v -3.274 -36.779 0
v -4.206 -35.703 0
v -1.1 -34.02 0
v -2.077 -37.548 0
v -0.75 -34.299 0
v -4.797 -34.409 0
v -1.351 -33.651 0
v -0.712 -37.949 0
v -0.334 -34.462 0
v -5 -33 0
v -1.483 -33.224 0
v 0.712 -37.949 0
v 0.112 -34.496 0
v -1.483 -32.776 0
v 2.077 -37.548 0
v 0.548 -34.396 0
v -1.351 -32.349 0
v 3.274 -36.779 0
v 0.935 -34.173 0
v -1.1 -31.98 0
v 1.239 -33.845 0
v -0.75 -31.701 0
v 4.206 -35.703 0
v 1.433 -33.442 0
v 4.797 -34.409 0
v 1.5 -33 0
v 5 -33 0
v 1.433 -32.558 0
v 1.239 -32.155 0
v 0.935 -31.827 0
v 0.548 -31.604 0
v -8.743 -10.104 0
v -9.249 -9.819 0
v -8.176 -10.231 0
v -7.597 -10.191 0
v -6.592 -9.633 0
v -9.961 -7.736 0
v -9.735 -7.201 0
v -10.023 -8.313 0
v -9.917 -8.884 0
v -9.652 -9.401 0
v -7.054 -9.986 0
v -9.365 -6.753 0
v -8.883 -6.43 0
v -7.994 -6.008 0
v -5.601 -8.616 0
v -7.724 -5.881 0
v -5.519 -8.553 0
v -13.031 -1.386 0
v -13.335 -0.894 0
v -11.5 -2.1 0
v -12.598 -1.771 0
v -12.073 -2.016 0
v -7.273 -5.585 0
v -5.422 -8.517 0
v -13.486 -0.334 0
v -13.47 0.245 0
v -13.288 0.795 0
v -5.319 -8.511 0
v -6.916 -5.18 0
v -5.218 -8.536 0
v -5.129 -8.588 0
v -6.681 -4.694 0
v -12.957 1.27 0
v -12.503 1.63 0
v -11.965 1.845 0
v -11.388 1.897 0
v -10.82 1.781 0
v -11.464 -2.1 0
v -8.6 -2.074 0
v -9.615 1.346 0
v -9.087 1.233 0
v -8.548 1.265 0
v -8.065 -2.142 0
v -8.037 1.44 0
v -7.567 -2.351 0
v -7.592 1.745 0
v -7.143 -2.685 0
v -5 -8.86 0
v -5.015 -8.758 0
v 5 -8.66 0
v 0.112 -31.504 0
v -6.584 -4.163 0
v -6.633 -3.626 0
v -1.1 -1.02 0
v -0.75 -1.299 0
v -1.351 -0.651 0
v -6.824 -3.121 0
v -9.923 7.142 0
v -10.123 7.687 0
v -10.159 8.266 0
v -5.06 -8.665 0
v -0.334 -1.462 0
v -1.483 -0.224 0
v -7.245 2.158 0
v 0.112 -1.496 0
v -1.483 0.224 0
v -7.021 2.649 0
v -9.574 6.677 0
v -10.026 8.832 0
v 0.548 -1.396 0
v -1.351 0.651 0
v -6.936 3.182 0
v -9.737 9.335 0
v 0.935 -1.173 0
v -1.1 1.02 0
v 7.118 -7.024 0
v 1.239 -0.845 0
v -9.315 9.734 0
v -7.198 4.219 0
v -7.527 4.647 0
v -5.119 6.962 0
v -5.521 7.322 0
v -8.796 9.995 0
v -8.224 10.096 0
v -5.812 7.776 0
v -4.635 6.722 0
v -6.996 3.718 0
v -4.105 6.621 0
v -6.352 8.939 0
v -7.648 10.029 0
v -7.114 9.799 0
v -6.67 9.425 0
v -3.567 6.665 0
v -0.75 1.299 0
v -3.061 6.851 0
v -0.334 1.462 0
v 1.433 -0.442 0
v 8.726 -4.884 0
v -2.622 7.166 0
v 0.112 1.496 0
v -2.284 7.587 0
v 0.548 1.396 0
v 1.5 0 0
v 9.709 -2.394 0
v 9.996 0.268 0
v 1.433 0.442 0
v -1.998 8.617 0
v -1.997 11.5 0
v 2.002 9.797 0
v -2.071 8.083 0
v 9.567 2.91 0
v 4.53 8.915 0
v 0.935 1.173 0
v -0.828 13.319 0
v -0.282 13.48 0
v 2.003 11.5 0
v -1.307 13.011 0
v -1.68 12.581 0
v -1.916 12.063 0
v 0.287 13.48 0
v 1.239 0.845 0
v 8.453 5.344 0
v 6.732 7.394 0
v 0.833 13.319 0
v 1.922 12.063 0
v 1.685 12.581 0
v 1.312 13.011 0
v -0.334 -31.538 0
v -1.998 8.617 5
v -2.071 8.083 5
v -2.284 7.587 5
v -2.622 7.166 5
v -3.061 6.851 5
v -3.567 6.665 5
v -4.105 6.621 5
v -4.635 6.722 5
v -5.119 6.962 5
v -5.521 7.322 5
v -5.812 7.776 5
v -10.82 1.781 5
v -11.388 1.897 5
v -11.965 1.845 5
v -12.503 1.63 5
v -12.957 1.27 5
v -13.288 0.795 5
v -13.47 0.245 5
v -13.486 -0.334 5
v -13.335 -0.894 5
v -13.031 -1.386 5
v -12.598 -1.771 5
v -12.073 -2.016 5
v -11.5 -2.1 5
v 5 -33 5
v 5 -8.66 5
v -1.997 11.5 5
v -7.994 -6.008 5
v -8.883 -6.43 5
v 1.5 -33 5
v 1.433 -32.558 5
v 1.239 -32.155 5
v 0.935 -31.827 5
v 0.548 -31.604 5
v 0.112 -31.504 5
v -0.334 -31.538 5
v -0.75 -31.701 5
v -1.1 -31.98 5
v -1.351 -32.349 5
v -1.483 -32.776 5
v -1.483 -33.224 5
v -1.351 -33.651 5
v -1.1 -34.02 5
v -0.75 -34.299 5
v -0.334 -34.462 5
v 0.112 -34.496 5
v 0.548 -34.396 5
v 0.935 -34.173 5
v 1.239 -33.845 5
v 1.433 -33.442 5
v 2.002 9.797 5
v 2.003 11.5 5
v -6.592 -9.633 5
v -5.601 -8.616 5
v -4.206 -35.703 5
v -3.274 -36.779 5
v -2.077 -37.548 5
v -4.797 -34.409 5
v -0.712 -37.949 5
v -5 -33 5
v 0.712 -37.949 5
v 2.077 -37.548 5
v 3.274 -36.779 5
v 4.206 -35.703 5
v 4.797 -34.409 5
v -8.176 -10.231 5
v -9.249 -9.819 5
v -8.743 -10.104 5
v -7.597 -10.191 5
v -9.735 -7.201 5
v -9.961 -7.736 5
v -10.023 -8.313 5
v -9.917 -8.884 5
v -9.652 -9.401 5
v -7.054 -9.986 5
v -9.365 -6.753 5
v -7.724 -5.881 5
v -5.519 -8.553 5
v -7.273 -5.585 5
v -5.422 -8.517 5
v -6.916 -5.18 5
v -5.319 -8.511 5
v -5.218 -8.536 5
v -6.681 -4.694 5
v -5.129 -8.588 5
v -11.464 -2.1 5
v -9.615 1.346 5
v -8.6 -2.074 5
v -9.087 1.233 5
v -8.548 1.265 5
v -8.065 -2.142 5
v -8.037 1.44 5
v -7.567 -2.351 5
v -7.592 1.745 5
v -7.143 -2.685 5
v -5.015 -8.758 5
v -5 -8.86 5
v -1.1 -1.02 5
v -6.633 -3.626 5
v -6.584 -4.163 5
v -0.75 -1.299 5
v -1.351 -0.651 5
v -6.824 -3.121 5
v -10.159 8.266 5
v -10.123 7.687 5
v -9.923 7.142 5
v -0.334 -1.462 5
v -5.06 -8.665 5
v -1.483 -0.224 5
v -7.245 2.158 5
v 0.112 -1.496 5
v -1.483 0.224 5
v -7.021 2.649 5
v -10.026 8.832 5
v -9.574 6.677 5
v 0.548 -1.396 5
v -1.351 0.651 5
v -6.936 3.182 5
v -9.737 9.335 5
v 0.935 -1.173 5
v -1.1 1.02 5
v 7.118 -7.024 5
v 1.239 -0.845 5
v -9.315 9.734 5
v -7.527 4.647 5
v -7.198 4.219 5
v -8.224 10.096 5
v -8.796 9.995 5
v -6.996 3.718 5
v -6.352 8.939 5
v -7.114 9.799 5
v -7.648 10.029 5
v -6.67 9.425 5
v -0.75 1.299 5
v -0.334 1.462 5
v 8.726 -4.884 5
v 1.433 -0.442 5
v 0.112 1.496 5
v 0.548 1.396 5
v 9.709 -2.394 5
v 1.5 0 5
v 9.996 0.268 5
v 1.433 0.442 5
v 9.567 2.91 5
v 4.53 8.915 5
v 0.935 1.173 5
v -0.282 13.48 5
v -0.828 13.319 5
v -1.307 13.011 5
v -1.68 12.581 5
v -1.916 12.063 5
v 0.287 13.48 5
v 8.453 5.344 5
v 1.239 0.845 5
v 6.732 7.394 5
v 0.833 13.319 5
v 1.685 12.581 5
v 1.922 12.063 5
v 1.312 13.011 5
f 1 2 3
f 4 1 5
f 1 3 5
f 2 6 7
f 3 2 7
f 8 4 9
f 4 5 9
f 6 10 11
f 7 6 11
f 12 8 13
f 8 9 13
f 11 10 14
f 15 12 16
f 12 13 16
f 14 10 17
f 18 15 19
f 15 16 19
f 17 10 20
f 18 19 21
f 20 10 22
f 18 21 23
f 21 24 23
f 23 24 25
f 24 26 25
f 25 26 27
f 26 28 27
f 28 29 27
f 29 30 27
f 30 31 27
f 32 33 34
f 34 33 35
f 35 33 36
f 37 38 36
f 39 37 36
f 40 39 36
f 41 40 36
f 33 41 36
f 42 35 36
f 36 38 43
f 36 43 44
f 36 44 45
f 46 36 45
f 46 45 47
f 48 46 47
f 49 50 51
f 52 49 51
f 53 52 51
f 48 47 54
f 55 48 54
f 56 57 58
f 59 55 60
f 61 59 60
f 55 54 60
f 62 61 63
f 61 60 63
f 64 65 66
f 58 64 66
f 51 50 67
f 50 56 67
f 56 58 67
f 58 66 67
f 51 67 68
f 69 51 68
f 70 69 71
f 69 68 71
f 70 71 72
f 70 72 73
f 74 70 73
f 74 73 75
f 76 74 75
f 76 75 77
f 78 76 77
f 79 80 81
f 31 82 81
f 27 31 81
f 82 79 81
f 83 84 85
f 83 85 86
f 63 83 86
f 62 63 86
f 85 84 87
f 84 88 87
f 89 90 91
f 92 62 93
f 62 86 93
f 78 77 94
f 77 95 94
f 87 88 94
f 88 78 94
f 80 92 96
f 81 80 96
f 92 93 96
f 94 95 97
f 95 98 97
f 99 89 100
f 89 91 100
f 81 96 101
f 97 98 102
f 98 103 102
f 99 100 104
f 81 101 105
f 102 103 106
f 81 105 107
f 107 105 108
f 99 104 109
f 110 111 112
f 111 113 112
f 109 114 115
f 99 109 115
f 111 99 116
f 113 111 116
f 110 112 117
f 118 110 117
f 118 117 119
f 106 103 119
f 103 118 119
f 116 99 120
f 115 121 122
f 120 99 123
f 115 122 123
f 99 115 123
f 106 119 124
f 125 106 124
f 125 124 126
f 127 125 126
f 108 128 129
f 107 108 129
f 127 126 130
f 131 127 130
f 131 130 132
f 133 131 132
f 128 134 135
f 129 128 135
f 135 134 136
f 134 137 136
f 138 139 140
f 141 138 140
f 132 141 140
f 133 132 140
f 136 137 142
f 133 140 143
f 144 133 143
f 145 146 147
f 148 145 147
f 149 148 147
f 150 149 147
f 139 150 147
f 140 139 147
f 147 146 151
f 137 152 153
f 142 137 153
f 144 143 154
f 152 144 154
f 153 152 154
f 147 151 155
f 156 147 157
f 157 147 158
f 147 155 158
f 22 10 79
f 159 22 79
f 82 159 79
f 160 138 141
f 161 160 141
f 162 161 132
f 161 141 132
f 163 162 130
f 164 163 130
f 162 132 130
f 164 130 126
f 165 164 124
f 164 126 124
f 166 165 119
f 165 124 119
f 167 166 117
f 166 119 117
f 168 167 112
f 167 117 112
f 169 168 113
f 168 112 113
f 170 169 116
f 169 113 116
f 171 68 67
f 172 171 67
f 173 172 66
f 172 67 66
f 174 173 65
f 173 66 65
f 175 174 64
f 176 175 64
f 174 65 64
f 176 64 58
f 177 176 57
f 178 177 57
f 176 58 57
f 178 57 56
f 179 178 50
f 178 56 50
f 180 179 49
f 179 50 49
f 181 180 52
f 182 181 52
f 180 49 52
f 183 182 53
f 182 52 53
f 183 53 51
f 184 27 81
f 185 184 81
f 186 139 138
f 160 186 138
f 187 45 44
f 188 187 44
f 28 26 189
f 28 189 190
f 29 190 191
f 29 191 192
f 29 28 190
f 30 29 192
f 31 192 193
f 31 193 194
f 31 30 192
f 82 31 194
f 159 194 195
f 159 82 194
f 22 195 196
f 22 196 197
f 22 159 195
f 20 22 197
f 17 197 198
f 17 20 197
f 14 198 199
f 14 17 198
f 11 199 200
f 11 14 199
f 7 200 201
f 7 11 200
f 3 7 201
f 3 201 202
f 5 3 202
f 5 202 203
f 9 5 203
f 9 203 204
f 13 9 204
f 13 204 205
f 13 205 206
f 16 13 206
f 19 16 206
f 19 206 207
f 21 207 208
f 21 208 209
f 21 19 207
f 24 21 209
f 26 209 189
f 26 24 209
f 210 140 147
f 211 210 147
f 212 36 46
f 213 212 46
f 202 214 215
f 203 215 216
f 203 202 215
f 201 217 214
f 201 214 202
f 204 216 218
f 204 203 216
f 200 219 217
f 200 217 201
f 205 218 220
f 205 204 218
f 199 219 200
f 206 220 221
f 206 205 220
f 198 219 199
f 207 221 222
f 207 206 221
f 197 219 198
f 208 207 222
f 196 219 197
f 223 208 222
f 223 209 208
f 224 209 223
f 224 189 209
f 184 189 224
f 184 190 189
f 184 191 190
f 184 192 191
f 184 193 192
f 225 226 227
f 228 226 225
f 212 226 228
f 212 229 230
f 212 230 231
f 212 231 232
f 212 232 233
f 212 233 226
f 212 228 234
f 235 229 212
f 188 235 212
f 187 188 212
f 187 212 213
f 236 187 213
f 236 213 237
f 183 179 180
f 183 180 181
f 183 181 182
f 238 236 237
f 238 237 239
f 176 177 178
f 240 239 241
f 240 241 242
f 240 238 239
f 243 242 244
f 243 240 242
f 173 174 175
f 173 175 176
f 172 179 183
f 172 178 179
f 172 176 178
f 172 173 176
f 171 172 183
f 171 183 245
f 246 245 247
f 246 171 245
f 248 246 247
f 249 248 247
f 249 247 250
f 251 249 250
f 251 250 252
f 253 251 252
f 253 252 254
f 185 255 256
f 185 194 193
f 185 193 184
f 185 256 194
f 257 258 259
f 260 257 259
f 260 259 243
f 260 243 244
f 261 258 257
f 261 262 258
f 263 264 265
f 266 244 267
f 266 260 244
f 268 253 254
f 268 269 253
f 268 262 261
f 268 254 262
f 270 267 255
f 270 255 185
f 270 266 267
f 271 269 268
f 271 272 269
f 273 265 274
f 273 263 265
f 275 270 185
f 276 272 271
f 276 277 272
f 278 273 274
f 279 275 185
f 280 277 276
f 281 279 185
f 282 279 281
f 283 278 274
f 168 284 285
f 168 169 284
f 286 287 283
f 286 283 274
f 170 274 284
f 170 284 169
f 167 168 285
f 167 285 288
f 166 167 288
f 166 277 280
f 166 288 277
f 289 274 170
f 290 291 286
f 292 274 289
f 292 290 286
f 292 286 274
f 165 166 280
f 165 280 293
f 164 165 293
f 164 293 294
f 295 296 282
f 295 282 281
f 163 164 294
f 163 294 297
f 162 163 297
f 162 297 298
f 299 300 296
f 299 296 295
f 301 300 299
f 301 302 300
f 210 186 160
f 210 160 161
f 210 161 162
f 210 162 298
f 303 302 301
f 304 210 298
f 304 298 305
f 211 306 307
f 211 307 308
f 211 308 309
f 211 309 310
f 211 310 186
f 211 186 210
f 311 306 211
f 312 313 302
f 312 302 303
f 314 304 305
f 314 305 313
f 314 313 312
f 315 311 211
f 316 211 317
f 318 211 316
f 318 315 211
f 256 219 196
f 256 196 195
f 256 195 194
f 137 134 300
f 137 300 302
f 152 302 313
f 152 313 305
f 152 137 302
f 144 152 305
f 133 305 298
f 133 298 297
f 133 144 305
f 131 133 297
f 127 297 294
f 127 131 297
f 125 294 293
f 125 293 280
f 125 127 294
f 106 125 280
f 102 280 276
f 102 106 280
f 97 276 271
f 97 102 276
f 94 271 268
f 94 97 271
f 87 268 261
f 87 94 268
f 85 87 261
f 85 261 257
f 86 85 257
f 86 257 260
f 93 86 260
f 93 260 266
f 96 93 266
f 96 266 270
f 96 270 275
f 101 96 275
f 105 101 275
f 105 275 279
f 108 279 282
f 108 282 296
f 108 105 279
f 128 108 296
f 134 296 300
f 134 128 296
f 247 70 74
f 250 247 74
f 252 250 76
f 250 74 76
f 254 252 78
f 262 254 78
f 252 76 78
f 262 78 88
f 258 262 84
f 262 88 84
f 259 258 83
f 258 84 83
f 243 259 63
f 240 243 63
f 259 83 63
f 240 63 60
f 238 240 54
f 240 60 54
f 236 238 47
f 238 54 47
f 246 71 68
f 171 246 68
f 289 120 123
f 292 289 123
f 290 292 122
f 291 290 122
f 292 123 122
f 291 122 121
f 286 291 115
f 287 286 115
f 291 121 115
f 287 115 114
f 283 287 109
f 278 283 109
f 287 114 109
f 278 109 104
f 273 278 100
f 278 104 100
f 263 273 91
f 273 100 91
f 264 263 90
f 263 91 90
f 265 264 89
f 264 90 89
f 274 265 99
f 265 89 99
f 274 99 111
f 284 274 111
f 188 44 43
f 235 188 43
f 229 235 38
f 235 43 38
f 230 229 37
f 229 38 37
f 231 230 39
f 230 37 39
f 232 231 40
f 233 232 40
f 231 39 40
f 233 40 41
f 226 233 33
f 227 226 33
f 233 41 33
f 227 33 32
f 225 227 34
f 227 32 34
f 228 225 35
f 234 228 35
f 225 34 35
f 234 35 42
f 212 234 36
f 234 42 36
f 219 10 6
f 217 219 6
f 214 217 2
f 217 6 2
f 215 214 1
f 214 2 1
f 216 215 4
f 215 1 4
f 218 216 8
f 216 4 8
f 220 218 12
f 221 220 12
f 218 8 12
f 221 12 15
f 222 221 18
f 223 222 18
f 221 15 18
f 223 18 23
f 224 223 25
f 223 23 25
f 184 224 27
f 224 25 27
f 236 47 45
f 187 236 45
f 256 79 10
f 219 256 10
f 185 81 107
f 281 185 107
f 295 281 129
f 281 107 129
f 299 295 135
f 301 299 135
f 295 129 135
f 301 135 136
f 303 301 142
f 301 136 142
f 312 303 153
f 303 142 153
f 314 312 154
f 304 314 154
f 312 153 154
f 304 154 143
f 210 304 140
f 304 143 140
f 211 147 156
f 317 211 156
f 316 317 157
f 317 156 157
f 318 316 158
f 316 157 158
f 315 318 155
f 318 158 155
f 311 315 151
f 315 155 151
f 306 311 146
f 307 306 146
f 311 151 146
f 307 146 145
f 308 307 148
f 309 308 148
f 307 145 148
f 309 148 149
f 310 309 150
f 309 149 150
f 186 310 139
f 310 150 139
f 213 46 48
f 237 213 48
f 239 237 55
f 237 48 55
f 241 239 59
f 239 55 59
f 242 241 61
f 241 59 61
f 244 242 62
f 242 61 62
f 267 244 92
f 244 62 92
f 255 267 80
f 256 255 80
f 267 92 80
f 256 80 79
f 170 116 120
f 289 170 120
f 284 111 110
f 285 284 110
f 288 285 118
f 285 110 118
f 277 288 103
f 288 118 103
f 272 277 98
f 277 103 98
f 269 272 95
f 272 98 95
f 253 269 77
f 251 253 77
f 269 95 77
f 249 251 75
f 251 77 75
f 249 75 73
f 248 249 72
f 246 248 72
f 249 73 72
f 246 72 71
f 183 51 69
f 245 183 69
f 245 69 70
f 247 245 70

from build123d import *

# Parameters (mm, degrees)
SKETCH2_R           = 1.5
BOSS_EXTRUDE1_DEPTH = 5


with BuildPart() as part:
    # Sketch2 → Boss-Extrude1 (new body)
    with BuildSketch(Plane.XY):
        with BuildLine():
            Line((5, -33), (5, -8.660254038))
            ThreePointArc((5, -8.660254038), (9.870667346, 1.603098918), (2.002269745, 9.797495388))
            Line((2.002269745, 9.797495388), (2.00266405, 11.49953636))
            Line((2.00266405, 11.49953636), (2.002664157, 11.499999691))
            ThreePointArc((2.002664157, 11.499999691), (0.002664157, 13.499999691), (-1.997335843, 11.499999691))
            Line((-1.997335843, 11.499999691), (-1.998003665, 8.617307095))
            ThreePointArc((-1.998003665, 8.617307095), (-3.567262635, 6.664705601), (-5.812270881, 7.776085051))
            Line((-5.812270881, 7.776085051), (-6.351761581, 8.938967191))
            ThreePointArc((-6.351761581, 8.938967191), (-9.315039529, 9.734283484), (-9.574251776, 6.677102885))
            Line((-9.574251776, 6.677102885), (-7.526953052, 4.647039677))
            ThreePointArc((-7.526953052, 4.647039677), (-7.244787999, 2.157941439), (-9.614515081, 1.345771067))
            Line((-9.614515081, 1.345771067), (-10.820227093, 1.781203427))
            ThreePointArc((-10.820227093, 1.781203427), (-13.469614339, 0.244947506), (-11.499566198, -2.099886252))
            Line((-11.499566198, -2.099886252), (-11.463831285, -2.099566981))
            Line((-11.463831285, -2.099566981), (-8.600020221, -2.073980428))
            ThreePointArc((-8.600020221, -2.073980428), (-6.633040893, -3.625608638), (-7.724488765, -5.880669462))
            Line((-7.724488765, -5.880669462), (-7.993660259, -6.008443697))
            Line((-7.993660259, -6.008443697), (-8.882563754, -6.430401321))
            ThreePointArc((-8.882563754, -6.430401321), (-9.651698384, -9.400582629), (-6.592349134, -9.632805038))
            Line((-6.592349134, -9.632805038), (-5.601479532, -8.615725566))
            ThreePointArc((-5.601479532, -8.615725566), (-5.218458324, -8.535632344), (-5, -8.860280046))
            Line((-5, -8.860280046), (-5, -33))
            ThreePointArc((-5, -33), (0, -38), (5, -33))
        make_face()
        with Locations((0, -33)):
            Circle(SKETCH2_R, mode=Mode.SUBTRACT)
        Circle(SKETCH2_R, mode=Mode.SUBTRACT)
    extrude(amount=BOSS_EXTRUDE1_DEPTH)


solid = part.part
